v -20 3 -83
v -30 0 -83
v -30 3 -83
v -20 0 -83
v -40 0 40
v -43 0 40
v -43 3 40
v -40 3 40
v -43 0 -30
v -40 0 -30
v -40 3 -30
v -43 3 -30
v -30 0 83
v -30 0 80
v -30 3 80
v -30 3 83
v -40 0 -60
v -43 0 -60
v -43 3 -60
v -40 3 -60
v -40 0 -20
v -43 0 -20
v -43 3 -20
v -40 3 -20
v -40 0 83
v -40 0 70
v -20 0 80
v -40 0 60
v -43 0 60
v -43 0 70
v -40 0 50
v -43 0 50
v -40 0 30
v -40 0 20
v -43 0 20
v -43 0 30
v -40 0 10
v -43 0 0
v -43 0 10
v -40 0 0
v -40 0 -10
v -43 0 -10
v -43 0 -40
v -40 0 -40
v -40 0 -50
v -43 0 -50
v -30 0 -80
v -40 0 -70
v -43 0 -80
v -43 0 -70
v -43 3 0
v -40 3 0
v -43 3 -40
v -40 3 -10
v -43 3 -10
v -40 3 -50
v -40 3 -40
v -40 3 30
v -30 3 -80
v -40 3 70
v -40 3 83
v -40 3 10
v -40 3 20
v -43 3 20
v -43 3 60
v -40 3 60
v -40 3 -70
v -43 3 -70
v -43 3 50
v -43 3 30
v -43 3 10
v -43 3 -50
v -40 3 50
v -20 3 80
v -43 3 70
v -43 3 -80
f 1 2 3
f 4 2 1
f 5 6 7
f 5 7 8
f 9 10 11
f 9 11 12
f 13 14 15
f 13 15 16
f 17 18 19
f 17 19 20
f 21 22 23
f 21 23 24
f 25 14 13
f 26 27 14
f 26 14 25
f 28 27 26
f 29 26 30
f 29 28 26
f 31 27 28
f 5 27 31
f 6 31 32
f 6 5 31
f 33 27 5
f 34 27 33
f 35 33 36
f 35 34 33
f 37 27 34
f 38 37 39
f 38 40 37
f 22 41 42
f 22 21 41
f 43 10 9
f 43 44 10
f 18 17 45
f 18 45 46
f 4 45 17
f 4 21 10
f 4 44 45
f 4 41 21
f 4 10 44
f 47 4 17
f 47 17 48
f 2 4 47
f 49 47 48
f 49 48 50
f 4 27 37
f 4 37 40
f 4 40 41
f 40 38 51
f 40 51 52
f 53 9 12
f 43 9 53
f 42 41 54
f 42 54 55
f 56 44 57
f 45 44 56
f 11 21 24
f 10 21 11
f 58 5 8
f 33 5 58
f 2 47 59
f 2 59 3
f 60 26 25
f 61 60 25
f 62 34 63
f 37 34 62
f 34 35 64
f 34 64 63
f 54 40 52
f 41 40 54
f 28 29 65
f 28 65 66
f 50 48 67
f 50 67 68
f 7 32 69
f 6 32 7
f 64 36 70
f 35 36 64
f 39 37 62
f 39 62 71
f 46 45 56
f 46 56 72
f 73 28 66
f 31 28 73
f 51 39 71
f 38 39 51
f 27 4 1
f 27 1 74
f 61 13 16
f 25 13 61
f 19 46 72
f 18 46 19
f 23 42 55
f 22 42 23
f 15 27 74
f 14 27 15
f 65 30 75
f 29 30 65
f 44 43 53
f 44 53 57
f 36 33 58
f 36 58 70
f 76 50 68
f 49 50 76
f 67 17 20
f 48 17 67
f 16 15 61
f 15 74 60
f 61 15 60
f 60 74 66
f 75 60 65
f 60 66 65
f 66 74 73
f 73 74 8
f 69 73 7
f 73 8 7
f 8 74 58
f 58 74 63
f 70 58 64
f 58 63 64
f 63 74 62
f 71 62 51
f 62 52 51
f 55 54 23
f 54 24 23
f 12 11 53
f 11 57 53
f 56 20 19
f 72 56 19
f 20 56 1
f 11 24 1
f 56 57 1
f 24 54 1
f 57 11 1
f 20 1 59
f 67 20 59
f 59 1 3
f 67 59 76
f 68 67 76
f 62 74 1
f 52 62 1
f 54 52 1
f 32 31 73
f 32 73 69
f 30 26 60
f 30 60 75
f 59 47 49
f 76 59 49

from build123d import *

# Parameters (mm, degrees)
BOSS_EXTRUDE1_DEPTH = 3
SKETCH2_W           = 79.051219732
SKETCH2_H           = 181.686841404
CUT_EXTRUDE1_DEPTH  = 94.52539762


with BuildPart() as part:
    # Sketch1 → Boss-Extrude1 (new body)
    with BuildSketch(Plane(origin=(0, 0, 0), x_dir=(1, 0, 0), z_dir=(0, 1, 0))):
        Polygon((40, 80), (40, 70), (43, 70), (43, 60), (40, 60), (40, 50), (43, 50), (43, 40), (40, 40), (40, 30), (43, 30), (43, 20), (40, 20), (40, 10), (43, 10), (43, 0), (40, 0), (40, -10), (43, -10), (43, -20), (40, -20), (40, -30), (43, -30), (43, -40), (40, -40), (40, -50), (43, -50), (43, -60), (40, -60), (40, -70), (43, -70), (43, -80), (40, -80), (30, -80), (30, -83), (20, -83), (20, -80), (10, -80), (10, -83), (0, -83), (0, -80), (-10, -80), (-10, -83), (-20, -83), (-20, -80), (-30, -80), (-30, -83), (-40, -83), (-40, -80), (-40, -70), (-43, -70), (-43, -60), (-40, -60), (-40, -50), (-43, -50), (-43, -40), (-40, -40), (-40, -30), (-43, -30), (-43, -20), (-40, -20), (-40, -10), (-43, -10), (-43, 0), (-40, 0), (-40, 10), (-43, 10), (-43, 20), (-40, 20), (-40, 30), (-43, 30), (-43, 40), (-40, 40), (-40, 50), (-43, 50), (-43, 60), (-40, 60), (-40, 70), (-43, 70), (-43, 80), (-40, 80), (-30, 80), (-30, 83), (-20, 83), (-20, 80), (-10, 80), (-10, 83), (0, 83), (0, 80), (10, 80), (10, 83), (20, 83), (20, 80), (30, 80), (30, 83), (40, 83), align=None)
    extrude(amount=BOSS_EXTRUDE1_DEPTH)

    # Sketch2 → Cut-Extrude1 (cut, through all)
    with BuildSketch(Plane(origin=(0, 3, 0), x_dir=(1, 0, 0), z_dir=(0, 1, 0))):
        with Locations((19.525609866, -1.45411583)):
            Rectangle(SKETCH2_W, SKETCH2_H)
    extrude(amount=-CUT_EXTRUDE1_DEPTH, mode=Mode.SUBTRACT)


solid = part.part
